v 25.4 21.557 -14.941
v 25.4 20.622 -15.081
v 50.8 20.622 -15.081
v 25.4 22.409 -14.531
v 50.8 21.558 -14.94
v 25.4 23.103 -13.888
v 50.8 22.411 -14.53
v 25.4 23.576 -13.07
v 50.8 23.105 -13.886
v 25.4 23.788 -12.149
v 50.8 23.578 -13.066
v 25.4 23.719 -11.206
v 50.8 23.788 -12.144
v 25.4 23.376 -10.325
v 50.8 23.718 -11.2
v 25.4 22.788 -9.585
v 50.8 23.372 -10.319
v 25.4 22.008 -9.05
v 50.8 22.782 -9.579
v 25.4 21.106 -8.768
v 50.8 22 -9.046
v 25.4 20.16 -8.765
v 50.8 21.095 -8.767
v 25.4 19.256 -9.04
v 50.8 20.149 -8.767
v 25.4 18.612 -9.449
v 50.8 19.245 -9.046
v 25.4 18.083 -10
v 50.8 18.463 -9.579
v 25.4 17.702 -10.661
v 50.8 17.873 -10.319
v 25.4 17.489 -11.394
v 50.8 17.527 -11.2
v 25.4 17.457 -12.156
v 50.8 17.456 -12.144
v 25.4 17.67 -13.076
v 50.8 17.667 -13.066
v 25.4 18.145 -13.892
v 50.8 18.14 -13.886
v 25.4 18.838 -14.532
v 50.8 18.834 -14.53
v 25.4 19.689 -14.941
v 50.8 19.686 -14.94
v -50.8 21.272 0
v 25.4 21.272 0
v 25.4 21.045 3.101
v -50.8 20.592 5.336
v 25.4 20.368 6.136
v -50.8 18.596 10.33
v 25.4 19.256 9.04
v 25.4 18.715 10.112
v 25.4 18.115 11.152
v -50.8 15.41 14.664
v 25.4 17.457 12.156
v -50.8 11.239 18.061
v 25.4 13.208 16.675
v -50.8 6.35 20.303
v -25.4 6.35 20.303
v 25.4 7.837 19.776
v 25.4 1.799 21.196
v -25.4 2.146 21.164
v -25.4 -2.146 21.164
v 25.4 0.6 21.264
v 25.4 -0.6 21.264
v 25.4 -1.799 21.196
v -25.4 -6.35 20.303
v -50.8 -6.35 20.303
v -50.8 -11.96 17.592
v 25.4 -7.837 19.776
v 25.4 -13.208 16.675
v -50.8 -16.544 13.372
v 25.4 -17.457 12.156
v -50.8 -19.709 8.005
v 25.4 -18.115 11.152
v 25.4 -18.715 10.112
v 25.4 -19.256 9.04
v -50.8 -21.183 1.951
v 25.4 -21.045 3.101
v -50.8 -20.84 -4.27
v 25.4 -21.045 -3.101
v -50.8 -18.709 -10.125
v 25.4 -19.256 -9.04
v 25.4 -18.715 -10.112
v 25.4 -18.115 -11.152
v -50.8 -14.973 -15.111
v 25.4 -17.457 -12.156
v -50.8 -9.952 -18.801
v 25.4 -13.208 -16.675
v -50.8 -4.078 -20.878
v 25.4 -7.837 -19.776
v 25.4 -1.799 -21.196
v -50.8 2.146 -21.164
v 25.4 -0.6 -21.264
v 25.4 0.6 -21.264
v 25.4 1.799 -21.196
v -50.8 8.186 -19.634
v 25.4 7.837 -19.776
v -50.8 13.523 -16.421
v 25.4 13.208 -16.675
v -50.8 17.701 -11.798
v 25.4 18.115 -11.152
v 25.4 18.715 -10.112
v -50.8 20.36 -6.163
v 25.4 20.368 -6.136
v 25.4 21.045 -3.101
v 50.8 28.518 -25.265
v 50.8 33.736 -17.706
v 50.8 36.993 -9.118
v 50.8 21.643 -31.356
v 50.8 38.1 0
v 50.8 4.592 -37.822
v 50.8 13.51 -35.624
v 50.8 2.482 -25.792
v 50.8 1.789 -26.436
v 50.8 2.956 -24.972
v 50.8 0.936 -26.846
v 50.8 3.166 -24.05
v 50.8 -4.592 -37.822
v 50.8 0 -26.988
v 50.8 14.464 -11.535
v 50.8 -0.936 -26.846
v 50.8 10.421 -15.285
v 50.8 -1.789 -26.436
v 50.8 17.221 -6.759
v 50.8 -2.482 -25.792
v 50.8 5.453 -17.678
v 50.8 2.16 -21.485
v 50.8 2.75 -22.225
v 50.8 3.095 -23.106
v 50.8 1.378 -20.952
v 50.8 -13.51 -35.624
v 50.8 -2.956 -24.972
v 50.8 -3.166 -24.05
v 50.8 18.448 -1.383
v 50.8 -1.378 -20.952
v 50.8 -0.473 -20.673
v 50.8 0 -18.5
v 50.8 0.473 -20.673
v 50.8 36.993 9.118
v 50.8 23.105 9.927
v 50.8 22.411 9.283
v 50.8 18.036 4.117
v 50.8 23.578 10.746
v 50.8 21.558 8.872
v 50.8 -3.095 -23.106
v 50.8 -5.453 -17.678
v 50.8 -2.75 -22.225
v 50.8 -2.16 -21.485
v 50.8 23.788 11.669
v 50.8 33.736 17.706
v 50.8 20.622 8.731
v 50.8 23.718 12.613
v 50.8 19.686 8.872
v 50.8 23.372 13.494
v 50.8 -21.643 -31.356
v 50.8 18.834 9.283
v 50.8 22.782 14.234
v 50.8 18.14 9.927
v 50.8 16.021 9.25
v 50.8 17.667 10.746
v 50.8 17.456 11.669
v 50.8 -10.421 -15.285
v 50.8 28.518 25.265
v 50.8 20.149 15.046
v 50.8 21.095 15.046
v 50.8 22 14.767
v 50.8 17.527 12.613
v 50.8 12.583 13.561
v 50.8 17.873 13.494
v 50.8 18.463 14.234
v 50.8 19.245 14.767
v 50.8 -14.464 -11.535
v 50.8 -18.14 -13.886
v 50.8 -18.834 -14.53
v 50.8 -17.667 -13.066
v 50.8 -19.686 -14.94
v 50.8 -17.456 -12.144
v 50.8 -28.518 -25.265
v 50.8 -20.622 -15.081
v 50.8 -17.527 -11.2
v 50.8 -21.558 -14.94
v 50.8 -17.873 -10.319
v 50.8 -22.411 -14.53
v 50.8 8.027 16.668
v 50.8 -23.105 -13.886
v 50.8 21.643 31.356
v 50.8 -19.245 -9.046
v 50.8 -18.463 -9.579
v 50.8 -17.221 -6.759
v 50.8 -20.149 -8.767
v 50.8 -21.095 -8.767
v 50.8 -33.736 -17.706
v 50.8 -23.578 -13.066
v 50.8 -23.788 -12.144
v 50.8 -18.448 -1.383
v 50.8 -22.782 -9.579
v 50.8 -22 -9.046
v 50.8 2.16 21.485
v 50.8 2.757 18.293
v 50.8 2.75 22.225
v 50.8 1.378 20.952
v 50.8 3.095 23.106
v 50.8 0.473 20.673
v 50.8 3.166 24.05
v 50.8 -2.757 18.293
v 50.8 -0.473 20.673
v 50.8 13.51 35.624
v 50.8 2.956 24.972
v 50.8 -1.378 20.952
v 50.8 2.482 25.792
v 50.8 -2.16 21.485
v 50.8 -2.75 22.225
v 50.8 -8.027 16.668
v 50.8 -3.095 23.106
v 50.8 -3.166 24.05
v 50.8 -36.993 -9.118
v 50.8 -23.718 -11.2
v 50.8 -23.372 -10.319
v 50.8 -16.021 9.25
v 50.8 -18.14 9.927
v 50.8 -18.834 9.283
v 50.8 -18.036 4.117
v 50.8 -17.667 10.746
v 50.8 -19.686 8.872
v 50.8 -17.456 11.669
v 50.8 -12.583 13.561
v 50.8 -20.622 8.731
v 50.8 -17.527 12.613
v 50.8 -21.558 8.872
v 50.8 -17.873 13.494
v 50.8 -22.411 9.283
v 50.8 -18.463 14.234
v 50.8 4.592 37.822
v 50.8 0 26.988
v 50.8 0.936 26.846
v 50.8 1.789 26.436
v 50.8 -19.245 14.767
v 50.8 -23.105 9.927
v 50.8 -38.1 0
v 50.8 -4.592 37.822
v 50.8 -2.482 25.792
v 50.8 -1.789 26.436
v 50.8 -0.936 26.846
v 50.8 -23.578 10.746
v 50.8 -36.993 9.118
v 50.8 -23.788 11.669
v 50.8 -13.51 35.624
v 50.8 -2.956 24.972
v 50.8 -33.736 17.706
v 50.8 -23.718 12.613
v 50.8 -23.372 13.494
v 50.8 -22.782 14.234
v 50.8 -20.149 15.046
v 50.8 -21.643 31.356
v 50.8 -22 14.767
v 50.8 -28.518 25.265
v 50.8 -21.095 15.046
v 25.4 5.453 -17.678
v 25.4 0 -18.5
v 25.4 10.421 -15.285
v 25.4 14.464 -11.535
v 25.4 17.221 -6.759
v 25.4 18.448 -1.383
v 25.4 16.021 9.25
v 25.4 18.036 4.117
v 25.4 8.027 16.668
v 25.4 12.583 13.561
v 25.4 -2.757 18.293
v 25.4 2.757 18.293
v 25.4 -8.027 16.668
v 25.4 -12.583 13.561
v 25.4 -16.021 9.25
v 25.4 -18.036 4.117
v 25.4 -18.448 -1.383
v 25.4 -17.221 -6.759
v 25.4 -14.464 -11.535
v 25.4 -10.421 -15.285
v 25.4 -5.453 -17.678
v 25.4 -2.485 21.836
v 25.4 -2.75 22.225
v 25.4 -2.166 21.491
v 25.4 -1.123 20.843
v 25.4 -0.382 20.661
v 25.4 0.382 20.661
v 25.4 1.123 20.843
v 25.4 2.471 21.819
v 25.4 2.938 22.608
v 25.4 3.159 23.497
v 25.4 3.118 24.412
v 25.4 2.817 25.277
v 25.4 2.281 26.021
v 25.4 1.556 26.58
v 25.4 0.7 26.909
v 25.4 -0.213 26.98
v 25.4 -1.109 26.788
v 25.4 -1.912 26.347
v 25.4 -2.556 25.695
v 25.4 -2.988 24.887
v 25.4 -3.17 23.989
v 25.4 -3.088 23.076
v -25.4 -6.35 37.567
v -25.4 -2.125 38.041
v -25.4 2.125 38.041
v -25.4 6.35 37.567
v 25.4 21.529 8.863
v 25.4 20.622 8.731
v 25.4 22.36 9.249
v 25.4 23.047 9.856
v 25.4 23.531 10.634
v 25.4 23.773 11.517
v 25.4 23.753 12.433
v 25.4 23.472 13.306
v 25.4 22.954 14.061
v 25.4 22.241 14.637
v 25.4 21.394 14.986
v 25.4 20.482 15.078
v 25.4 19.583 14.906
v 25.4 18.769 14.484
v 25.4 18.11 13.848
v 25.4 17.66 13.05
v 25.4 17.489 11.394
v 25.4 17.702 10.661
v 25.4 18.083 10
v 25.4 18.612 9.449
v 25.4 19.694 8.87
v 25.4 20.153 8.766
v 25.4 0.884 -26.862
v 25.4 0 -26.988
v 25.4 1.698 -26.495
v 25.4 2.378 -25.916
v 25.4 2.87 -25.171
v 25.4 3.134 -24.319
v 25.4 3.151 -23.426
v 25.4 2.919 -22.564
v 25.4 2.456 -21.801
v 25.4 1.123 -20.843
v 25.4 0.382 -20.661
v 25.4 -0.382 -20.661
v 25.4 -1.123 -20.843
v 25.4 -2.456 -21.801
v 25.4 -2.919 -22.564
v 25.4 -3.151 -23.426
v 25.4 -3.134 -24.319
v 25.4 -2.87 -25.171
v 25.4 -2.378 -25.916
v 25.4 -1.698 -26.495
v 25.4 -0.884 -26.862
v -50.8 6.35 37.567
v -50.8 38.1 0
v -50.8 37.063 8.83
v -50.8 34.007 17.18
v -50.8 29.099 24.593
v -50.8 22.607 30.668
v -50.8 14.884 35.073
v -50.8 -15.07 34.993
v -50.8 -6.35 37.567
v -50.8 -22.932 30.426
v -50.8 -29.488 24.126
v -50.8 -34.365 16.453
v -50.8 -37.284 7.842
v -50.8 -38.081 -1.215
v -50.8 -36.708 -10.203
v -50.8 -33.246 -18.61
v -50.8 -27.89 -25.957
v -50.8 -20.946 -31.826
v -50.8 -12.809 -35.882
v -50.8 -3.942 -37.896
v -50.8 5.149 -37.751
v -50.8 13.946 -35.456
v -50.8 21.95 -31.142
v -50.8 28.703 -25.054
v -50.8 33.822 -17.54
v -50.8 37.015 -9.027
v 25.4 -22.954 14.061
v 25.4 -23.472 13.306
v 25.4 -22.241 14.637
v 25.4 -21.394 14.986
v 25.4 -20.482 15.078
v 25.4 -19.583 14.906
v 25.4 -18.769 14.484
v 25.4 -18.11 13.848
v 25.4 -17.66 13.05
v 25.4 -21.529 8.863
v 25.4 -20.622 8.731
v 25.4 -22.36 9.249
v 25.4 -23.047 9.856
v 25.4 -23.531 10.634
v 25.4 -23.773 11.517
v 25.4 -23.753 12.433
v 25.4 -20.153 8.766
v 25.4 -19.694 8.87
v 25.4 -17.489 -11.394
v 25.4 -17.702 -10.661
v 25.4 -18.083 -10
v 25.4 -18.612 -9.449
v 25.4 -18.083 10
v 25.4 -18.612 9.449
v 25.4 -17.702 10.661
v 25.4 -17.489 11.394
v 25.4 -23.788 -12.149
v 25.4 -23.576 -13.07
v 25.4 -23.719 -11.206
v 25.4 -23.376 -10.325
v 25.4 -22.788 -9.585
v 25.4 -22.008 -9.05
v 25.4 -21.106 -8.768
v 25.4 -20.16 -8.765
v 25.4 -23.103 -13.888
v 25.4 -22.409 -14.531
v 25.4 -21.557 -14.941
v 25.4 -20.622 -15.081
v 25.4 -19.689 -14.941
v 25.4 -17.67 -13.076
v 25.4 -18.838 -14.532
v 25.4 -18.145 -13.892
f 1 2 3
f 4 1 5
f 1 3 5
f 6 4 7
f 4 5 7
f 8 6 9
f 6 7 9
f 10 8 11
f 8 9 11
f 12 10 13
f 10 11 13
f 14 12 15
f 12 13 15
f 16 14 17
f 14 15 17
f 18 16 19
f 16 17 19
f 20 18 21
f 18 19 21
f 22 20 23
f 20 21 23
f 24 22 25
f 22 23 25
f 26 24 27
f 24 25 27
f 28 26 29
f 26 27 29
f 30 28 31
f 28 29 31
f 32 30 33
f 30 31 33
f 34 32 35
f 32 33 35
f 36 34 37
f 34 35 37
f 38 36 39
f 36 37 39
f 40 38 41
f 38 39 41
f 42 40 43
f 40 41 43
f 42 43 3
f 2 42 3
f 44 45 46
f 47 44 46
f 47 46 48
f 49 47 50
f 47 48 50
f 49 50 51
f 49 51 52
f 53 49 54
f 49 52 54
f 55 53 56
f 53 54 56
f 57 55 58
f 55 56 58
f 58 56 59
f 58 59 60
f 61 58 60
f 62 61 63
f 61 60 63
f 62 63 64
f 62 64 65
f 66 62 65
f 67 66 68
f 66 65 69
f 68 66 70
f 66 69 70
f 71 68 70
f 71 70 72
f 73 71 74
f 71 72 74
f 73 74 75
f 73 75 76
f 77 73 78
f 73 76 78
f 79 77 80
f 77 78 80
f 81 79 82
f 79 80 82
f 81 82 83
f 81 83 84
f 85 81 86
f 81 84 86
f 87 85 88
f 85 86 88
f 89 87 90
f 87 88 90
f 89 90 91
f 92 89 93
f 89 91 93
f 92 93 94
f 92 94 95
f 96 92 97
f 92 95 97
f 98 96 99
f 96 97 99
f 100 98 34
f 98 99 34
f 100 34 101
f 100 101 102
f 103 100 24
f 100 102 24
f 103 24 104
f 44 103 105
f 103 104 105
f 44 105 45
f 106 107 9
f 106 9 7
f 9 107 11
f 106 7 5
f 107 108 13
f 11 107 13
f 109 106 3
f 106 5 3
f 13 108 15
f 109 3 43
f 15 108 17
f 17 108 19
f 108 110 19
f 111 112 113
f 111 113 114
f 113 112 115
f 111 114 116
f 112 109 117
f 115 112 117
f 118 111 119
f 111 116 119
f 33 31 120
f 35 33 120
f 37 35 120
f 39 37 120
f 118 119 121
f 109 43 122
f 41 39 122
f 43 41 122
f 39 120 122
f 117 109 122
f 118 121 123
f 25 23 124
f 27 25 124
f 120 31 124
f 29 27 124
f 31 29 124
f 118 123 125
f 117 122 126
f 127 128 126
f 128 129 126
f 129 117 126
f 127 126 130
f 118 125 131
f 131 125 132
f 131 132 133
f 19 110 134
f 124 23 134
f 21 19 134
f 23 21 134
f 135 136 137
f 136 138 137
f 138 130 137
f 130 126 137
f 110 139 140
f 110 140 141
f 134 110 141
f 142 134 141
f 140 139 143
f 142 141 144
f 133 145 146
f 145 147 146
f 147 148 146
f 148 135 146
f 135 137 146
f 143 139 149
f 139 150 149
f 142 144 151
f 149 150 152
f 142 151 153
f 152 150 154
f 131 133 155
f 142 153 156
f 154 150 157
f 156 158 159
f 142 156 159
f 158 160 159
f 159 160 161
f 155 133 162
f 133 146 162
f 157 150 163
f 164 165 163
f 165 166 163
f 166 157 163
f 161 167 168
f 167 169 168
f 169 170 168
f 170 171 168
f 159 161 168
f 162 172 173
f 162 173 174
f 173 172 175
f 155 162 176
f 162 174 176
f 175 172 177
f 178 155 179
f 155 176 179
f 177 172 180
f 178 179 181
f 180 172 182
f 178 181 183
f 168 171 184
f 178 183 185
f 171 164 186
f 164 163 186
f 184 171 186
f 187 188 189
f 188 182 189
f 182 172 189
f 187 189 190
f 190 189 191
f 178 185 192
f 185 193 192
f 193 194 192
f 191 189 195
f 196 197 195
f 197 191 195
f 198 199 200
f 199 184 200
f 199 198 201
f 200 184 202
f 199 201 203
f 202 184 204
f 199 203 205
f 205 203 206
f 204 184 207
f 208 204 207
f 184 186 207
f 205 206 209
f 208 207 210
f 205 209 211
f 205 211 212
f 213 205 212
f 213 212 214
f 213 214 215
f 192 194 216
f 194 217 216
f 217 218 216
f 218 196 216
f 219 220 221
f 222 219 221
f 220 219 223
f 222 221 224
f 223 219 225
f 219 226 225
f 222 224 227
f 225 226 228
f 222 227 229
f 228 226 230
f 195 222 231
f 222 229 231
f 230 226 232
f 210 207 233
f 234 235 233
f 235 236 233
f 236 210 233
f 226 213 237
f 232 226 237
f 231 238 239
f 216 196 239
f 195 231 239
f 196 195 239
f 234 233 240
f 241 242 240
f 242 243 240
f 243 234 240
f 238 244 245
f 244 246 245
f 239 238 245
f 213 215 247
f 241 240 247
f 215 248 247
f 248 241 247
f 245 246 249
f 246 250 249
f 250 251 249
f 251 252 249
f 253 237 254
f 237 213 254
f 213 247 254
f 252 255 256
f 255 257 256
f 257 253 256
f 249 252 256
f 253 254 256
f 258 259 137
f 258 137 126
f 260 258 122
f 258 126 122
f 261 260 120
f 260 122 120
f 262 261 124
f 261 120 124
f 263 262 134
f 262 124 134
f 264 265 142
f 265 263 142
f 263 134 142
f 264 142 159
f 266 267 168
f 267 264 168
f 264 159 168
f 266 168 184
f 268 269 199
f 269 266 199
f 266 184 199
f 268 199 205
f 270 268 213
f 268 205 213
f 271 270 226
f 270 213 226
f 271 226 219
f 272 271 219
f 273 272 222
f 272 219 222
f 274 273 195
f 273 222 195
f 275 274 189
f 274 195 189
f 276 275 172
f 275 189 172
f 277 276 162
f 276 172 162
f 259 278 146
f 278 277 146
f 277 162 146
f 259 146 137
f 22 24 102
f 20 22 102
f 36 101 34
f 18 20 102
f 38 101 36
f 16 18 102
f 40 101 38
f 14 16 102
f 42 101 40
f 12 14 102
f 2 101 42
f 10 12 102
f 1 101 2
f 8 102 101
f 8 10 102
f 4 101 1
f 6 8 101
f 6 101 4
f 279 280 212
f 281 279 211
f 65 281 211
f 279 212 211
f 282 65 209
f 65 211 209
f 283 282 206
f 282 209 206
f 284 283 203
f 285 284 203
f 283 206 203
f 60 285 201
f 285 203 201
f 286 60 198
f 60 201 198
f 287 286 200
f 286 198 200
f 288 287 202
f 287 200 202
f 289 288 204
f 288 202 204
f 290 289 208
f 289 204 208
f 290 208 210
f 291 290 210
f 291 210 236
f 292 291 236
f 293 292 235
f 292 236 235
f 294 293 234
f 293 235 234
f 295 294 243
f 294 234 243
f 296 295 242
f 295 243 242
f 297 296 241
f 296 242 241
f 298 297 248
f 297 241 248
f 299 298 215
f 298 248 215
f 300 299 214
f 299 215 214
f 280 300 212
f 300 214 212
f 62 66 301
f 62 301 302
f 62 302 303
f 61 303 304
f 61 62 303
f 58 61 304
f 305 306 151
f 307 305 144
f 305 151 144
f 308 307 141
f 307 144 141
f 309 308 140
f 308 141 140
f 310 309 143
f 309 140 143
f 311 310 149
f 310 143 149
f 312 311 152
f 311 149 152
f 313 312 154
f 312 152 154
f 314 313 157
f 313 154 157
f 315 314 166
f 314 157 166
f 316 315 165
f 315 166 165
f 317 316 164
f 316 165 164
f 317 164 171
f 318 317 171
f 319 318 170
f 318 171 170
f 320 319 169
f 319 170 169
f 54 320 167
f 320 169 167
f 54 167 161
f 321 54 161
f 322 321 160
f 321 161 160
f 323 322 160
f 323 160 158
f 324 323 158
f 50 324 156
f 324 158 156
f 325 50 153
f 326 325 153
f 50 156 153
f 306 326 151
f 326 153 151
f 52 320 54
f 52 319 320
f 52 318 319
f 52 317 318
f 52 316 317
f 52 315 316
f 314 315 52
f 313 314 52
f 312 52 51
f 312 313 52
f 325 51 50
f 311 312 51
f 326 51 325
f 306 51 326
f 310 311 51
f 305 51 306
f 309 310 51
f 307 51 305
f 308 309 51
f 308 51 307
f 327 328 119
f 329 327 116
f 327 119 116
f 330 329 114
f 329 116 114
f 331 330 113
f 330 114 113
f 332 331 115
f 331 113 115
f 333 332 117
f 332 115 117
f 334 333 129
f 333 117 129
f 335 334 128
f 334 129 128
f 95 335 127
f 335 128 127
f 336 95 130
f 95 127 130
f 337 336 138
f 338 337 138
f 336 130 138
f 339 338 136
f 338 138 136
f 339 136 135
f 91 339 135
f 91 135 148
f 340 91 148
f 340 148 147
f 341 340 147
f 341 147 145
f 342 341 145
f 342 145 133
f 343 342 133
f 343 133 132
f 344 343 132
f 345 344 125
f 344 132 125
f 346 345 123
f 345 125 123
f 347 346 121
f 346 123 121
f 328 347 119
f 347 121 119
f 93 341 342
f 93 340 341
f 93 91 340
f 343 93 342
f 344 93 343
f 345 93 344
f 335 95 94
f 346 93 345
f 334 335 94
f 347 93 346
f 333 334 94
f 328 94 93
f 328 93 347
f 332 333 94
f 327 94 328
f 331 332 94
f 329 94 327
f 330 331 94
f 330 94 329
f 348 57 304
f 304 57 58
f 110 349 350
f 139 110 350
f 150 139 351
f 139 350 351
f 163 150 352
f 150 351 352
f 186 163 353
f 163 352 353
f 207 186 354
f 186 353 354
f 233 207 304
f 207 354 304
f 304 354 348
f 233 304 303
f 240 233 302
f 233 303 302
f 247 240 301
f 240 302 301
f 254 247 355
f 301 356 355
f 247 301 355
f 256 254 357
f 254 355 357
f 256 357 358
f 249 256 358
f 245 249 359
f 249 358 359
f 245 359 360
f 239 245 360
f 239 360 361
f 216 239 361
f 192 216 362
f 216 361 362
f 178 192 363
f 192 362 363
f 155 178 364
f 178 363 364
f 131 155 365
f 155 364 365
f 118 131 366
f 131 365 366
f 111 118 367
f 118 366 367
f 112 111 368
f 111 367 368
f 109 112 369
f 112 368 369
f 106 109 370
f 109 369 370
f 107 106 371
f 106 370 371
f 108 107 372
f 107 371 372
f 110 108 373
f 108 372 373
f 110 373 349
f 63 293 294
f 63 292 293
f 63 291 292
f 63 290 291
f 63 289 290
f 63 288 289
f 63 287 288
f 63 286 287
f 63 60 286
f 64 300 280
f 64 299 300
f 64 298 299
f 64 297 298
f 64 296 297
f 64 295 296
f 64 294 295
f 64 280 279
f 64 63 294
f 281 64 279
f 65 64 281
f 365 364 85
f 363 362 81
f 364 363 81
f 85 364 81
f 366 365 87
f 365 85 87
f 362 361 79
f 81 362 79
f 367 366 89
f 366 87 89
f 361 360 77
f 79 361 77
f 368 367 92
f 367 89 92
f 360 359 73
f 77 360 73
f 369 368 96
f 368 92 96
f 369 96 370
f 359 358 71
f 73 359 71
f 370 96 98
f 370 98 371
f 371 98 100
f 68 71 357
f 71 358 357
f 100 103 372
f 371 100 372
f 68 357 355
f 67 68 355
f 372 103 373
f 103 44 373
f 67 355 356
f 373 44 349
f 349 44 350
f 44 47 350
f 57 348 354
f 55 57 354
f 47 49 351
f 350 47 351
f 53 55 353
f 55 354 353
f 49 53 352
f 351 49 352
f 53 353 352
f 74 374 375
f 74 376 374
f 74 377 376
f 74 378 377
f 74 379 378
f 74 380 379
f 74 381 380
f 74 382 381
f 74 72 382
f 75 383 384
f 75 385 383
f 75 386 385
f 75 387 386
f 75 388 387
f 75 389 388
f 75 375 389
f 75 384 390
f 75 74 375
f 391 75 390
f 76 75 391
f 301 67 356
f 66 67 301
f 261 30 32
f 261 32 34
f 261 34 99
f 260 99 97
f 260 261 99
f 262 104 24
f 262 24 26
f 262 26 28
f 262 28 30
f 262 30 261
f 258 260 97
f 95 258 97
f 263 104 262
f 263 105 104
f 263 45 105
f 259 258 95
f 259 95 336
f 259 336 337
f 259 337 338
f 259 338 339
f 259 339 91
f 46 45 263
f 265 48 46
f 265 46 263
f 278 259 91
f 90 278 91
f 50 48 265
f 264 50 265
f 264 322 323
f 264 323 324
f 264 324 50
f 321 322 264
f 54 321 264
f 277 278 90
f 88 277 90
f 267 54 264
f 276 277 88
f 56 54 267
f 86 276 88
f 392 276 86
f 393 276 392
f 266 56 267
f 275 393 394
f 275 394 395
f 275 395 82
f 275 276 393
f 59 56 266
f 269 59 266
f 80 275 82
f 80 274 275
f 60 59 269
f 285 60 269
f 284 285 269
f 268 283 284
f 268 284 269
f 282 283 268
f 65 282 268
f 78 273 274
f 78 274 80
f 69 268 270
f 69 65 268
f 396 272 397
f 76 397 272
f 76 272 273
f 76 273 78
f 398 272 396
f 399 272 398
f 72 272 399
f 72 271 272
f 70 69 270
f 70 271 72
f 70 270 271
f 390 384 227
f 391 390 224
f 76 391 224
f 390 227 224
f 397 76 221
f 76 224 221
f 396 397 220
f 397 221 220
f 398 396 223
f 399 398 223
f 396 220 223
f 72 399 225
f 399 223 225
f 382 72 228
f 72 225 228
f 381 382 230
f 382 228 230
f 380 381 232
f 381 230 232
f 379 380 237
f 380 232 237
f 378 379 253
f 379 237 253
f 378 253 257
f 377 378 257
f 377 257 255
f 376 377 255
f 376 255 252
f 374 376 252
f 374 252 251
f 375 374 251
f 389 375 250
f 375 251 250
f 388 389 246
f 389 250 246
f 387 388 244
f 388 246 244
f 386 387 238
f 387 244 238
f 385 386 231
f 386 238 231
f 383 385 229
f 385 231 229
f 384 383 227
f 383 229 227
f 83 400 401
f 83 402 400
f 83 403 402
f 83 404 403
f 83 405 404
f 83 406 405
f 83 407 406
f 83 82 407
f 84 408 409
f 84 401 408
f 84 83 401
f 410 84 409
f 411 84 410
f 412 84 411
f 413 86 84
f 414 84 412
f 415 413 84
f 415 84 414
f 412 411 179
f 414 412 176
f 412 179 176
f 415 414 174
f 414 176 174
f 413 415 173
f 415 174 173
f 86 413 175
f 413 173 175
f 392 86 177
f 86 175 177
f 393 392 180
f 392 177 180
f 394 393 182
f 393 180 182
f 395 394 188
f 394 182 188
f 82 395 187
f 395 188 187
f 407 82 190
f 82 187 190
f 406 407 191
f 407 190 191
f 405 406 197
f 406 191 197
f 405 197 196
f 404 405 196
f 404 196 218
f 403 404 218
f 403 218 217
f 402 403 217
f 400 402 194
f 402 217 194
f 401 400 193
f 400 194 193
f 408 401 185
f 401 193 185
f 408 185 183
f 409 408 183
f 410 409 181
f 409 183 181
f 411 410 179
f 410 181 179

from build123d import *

# Parameters (mm, degrees)
SKETCH1_W          = 25.4
SKETCH1_H          = 5.3975
SKETCH2_R          = 3.175
SKETCH2_R_2        = 18.5
CUT_EXTRUDE1_DEPTH = 25.4
CIRPATTERN1_COUNT  = 6
SKETCH3_W          = 25.4
SKETCH3_H          = 12.7
CUT_EXTRUDE2_DEPTH = 39.1


with BuildPart() as part:
    # Sketch1 → Revolve1 (revolve)
    with BuildSketch(Plane.XY):
        Polygon((-50.8, 38.1), (-50.8, 21.2725), (25.4, 21.2725), (50.8, 21.2725), (50.8, 38.1), (44.45, 38.1), align=None)
        with Locations((38.1, 18.57375)):
            Rectangle(SKETCH1_W, SKETCH1_H)
    revolve(axis=Axis((-50.8, 0, 0), (1, 0, 0)))

    # Sketch2 → Cut-Extrude1 (cut)
    with BuildSketch(Plane(origin=(50.8, 0, 0), x_dir=(0, 0, -1), z_dir=(1, 0, 0))):
        with Locations((-11.90625, -20.622229928)):
            Circle(SKETCH2_R)
        with Locations((11.90625, -20.622229928)):
            Circle(SKETCH2_R)
        with Locations((23.8125, 0)):
            Circle(SKETCH2_R)
        with Locations((11.90625, 20.622229928)):
            Circle(SKETCH2_R)
        with Locations((-11.90625, 20.622229928)):
            Circle(SKETCH2_R)
        Circle(SKETCH2_R_2)
    cut_extrude1 = extrude(amount=-CUT_EXTRUDE1_DEPTH, mode=Mode.SUBTRACT)

    # CirPattern1: Cut-Extrude1 ×6 about axis
    cirpattern1_axis = Axis((-50.8, 0, 0), (-1, 0, 0))
    for i in range(1, CIRPATTERN1_COUNT):
        add(cut_extrude1.rotate(cirpattern1_axis, i * 360 / CIRPATTERN1_COUNT), mode=Mode.SUBTRACT)

    # Sketch3 → Cut-Extrude2 (cut, through all)
    with BuildSketch(Plane.XY):
        with Locations((-38.1, 0)):
            Rectangle(SKETCH3_W, SKETCH3_H)
    extrude(amount=CUT_EXTRUDE2_DEPTH, mode=Mode.SUBTRACT)


solid = part.part
